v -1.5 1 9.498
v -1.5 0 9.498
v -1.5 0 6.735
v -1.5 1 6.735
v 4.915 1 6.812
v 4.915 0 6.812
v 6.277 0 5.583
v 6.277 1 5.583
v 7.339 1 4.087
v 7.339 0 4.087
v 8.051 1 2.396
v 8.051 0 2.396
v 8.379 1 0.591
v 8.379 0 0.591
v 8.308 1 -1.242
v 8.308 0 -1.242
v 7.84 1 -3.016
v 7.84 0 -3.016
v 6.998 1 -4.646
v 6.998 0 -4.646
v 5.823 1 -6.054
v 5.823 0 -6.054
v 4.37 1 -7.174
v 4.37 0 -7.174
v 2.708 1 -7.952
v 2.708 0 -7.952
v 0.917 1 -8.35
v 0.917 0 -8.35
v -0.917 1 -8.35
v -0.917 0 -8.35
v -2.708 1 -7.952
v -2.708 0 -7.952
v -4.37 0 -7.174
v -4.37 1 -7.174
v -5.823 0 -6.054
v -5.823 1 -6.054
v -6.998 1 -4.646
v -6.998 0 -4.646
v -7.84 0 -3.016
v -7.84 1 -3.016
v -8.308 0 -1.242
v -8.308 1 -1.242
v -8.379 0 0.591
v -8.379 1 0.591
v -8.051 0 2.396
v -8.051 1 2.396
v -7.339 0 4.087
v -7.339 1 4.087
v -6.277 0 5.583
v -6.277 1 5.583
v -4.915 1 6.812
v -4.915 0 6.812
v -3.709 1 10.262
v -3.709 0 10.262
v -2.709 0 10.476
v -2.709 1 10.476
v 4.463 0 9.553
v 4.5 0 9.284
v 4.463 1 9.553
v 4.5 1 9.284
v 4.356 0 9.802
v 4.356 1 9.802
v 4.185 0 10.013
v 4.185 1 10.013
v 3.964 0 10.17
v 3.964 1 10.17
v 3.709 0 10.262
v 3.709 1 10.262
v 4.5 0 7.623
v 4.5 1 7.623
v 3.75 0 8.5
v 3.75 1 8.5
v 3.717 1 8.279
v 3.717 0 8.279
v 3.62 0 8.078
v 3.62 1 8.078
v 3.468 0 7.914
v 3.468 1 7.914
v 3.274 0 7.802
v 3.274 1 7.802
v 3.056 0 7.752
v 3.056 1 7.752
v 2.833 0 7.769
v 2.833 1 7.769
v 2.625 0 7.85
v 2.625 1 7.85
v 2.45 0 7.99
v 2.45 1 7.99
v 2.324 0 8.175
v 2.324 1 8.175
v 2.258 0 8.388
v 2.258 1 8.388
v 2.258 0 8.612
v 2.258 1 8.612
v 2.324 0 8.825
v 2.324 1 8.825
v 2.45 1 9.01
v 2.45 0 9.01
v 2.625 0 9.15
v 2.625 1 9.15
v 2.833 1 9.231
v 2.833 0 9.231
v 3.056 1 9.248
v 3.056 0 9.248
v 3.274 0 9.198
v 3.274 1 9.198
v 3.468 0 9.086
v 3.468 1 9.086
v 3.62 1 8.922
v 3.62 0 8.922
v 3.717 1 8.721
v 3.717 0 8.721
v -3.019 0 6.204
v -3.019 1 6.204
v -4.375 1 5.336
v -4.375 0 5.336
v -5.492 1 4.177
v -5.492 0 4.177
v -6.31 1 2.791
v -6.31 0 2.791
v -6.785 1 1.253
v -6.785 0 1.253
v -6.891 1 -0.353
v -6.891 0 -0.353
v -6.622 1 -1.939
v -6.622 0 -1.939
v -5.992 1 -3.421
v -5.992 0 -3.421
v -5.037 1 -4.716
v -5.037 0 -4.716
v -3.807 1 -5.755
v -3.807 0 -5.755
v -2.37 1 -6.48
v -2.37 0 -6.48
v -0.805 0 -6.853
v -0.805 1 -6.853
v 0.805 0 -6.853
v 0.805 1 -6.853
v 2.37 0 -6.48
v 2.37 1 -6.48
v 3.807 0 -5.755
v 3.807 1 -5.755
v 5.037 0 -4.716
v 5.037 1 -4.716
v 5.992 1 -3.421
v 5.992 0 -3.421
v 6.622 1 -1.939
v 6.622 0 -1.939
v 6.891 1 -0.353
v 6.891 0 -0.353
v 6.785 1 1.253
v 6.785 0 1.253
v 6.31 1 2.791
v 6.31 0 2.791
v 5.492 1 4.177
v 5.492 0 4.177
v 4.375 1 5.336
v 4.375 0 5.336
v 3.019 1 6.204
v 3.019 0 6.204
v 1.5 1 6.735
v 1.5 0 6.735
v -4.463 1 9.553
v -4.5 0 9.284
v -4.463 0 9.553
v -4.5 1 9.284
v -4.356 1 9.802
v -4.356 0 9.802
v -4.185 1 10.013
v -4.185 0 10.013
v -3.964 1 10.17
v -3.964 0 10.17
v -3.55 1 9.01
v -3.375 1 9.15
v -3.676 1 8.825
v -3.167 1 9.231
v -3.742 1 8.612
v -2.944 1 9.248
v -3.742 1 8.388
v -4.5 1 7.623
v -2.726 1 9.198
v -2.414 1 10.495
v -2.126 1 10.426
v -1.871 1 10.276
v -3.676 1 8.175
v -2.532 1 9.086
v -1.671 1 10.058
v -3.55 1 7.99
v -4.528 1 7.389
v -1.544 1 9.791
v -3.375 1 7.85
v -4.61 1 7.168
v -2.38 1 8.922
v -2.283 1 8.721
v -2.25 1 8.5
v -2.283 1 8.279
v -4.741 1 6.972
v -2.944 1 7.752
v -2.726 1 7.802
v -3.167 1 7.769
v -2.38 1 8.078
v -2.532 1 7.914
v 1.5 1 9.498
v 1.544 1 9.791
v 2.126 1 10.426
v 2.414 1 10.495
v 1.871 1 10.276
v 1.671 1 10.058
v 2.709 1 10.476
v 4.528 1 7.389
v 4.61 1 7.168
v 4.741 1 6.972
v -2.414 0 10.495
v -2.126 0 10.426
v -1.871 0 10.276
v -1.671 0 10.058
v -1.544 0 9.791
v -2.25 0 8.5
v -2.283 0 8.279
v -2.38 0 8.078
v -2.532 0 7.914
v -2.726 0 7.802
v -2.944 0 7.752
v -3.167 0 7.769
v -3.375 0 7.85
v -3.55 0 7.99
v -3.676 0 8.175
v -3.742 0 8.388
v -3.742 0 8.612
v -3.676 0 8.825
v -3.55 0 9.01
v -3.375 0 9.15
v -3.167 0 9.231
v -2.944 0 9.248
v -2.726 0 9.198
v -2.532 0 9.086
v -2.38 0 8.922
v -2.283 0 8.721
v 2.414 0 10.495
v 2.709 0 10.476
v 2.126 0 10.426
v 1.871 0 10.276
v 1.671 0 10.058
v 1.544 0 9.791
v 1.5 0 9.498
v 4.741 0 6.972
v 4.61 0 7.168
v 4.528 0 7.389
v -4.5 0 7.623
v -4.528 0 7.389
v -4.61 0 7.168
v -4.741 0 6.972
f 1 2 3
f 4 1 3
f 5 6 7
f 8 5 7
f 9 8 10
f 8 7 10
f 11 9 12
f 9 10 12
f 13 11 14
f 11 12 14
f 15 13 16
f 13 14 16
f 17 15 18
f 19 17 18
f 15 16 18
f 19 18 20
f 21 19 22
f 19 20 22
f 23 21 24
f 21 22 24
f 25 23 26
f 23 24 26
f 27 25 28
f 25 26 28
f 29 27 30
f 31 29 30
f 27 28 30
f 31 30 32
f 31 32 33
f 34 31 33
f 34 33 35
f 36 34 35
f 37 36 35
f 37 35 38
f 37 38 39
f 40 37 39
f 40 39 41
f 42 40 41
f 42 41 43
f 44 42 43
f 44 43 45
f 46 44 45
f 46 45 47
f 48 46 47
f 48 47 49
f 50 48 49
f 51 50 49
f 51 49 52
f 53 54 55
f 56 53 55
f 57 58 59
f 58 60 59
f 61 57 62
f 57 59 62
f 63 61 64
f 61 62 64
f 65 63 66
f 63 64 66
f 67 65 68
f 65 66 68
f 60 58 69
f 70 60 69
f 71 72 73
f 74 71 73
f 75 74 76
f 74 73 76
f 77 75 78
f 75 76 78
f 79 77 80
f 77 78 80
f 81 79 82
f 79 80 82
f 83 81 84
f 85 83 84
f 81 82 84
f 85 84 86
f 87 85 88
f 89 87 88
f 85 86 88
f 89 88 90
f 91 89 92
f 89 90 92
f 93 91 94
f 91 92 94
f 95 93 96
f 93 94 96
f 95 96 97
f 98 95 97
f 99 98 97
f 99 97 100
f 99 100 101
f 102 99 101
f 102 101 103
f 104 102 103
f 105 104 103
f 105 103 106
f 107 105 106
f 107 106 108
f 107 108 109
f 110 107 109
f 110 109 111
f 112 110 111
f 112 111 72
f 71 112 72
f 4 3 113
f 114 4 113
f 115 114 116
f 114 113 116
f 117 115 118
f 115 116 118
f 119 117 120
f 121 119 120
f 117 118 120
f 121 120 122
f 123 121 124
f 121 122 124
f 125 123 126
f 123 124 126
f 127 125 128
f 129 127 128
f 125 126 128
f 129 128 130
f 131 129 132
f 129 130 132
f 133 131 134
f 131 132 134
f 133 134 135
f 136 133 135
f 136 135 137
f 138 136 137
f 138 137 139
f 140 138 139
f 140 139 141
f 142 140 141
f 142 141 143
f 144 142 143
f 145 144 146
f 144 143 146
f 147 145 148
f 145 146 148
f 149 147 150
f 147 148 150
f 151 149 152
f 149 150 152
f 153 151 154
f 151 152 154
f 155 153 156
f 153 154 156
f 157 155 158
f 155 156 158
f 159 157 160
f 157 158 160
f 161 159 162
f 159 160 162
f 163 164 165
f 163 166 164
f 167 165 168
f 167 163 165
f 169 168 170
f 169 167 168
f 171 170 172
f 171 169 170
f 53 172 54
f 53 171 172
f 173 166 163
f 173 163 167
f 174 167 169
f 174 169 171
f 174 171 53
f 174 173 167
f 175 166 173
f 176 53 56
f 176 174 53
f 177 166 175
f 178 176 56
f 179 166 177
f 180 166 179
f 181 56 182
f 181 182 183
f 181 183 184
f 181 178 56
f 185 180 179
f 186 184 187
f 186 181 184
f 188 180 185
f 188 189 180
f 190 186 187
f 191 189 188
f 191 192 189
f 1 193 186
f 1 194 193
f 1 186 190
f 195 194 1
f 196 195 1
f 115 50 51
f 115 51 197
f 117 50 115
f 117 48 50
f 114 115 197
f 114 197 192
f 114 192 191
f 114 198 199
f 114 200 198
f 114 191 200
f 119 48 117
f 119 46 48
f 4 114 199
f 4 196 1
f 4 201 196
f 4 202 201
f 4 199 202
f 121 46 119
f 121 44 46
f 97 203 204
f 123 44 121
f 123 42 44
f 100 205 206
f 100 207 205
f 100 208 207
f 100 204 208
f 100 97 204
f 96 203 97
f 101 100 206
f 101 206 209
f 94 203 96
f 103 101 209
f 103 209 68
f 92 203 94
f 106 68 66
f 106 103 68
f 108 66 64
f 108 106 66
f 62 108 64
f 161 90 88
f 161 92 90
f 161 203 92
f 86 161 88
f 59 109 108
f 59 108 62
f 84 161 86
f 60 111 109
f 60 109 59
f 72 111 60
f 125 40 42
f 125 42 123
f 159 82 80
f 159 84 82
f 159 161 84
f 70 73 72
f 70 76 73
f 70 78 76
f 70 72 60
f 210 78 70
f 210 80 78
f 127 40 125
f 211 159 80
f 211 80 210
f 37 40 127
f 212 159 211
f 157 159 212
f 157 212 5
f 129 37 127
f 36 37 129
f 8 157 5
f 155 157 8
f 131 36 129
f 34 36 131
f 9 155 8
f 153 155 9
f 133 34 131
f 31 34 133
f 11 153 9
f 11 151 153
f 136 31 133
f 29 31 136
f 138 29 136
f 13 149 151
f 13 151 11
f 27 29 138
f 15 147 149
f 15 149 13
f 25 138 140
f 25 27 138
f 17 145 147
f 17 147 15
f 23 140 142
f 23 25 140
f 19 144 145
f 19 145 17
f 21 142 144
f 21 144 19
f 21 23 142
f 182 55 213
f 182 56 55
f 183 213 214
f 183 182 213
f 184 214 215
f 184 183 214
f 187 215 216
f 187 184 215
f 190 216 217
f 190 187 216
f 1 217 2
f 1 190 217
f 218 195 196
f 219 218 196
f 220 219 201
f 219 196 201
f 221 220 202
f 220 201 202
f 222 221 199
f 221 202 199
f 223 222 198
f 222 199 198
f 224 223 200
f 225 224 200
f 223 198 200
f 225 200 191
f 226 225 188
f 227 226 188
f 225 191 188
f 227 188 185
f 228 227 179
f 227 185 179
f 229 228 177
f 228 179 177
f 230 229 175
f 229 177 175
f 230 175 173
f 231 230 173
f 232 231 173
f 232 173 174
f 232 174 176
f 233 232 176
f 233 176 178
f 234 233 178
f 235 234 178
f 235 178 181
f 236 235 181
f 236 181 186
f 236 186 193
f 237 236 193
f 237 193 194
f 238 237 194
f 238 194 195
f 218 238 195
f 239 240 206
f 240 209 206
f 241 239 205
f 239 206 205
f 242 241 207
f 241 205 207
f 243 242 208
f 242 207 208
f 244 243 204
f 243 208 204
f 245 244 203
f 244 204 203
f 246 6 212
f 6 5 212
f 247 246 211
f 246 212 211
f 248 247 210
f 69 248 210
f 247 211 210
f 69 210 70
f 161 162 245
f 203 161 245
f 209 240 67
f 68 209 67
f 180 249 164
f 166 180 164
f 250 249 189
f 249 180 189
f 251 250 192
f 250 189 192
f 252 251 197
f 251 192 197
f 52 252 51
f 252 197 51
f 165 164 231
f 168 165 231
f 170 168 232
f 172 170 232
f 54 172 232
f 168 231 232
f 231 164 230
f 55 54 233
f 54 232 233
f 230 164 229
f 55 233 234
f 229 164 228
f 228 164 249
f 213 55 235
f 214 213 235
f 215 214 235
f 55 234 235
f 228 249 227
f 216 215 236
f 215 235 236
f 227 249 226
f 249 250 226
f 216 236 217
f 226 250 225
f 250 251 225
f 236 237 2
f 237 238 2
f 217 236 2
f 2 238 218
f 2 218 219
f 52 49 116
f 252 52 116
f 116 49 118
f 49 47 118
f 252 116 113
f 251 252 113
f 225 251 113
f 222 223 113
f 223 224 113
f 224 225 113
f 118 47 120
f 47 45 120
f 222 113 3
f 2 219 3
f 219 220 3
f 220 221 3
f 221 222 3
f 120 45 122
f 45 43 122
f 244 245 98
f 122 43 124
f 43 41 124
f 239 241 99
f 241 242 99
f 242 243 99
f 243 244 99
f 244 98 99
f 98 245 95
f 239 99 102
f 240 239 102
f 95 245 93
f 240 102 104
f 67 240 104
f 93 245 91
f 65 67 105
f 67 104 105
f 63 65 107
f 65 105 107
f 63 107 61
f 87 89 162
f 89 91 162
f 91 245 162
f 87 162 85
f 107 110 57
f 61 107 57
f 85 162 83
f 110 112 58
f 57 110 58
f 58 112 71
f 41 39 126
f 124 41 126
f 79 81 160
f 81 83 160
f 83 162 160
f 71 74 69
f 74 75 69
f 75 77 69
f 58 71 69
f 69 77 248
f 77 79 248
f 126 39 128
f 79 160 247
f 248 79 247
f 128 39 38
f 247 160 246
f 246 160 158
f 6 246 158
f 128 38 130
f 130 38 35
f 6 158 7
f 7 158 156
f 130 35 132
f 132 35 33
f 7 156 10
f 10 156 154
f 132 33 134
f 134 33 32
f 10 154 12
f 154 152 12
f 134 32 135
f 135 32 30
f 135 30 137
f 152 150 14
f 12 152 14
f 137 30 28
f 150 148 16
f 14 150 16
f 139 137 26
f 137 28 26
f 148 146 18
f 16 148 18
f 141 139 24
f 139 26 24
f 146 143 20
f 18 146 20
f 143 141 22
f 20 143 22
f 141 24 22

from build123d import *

# Parameters (mm, degrees)
EXTRUDE_1_DEPTH     = 1
SKETCH_2_R          = 0.75
CUT_EXTRUDE_1_DEPTH = 2
FILLET_1_R          = 1


with BuildPart() as part:
    # 草图1 → 凸台-拉伸1 (new body)
    with BuildSketch(Plane(origin=(0, 0, 0), x_dir=(1, 0, 0), z_dir=(0, 1, 0))):
        with BuildLine():
            Line((-4.5, -7.092954251), (-4.5, -10.092954251))
            Line((-4.5, -10.092954251), (-1.5, -10.734983296))
            Line((-1.5, -10.734983296), (-1.5, -6.734983296))
            ThreePointArc((-1.5, -6.734983296), (0, 6.9), (1.5, -6.734983296))
            Line((1.5, -6.734983296), (1.5, -10.734983296))
            Line((1.5, -10.734983296), (4.5, -10.092954251))
            Line((4.5, -10.092954251), (4.5, -7.092954251))
            ThreePointArc((4.5, -7.092954251), (0, 8.4), (-4.5, -7.092954251))
        make_face()
    extrude(amount=EXTRUDE_1_DEPTH)

    # 草图2 → 切除-拉伸1 (cut, through all)
    with BuildSketch(Plane(origin=(0, 1, 0), x_dir=(1, 0, 0), z_dir=(0, 1, 0))):
        with Locations((-3, -8.5)):
            Circle(SKETCH_2_R)
        with Locations((3, -8.5)):
            Circle(SKETCH_2_R)
    extrude(amount=-CUT_EXTRUDE_1_DEPTH, mode=Mode.SUBTRACT)

    # 圆角1
    fillet_1_edges = [part.edges().sort_by_distance(p)[0] for p in [
        (4.5, 0.5, 7.092954251),
        (4.5, 0.5, 10.092954251),
        (1.5, 0.5, 10.734983296),
        (-1.5, 0.5, 10.734983296),
        (-4.5, 0.5, 10.092954251),
        (-4.5, 0.5, 7.092954251),
    ]]
    fillet(fillet_1_edges, radius=FILLET_1_R)


solid = part.part
